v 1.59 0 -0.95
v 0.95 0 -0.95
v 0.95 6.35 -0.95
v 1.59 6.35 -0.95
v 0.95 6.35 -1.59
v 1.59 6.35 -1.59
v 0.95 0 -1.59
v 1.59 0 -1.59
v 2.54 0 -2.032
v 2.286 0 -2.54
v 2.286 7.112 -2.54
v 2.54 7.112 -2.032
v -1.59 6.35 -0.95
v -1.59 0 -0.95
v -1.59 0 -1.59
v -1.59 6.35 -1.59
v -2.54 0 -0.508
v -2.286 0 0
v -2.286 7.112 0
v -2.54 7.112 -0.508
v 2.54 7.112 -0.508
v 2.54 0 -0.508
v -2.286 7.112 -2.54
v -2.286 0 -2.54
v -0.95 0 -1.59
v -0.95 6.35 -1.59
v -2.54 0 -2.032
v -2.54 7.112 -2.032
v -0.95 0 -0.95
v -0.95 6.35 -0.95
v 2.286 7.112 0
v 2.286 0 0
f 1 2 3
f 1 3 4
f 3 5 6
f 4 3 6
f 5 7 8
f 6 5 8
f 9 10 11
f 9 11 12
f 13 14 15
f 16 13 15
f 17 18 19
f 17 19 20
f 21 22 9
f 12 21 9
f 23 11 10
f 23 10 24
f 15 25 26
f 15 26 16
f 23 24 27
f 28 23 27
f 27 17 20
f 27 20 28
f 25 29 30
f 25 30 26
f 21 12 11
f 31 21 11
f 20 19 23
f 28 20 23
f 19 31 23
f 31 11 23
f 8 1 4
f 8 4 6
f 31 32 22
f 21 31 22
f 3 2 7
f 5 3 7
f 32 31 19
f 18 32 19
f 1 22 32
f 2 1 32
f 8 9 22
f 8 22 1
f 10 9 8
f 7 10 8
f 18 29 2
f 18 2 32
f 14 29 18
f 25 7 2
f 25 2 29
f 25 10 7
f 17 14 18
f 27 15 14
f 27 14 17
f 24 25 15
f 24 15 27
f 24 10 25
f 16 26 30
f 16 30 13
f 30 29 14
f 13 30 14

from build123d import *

# Parameters (mm, degrees)
SKETCH1_W           = 2.54
SKETCH1_H           = 2.54
MAIN_BODY_DEPTH     = 7.112
CUT_EXTRUDE_3_DEPTH = 7.112
SKETCH2_W           = 0.64
SKETCH2_H           = 0.64
CUT_EXTRUDE_4_DEPTH = 6.35


with BuildPart() as part:
    # Sketch1 → Main Body (new body)
    with BuildSketch(Plane(origin=(0, 0, 0), x_dir=(1, 0, 0), z_dir=(0, 1, 0))):
        with Locations((1.27, 1.27)):
            Rectangle(SKETCH1_W, SKETCH1_H)
    main_body = extrude(amount=MAIN_BODY_DEPTH)

    # Sketch4 → Вырез-Вытянуть3 (cut)
    with BuildSketch(Plane(origin=(0, 0, 0), x_dir=(1, 0, 0), z_dir=(0, 1, 0))):
        Polygon((2.54, 2.54), (2.286, 2.54), (2.54, 2.032), align=None)
        Polygon((2.54, 0), (2.286, 0), (2.54, 0.508), align=None)
    cut_extrude_3 = extrude(amount=CUT_EXTRUDE_3_DEPTH, mode=Mode.SUBTRACT)

    # Sketch2 → Вырез-Вытянуть4 (cut)
    with BuildSketch(Plane(origin=(0, 0, 0), x_dir=(1, 0, 0), z_dir=(0, 1, 0))):
        with Locations((1.27, 1.27)):
            Rectangle(SKETCH2_W, SKETCH2_H)
    cut_extrude_4 = extrude(amount=CUT_EXTRUDE_4_DEPTH, mode=Mode.SUBTRACT)

    # Зеркальное отражение1: Main Body, Вырез-Вытянуть3, Вырез-Вытянуть4 across Right Plane
    add(main_body.mirror(Plane(origin=(0, 0, 0), x_dir=(0, 0, -1), z_dir=(1, 0, 0))))
    add(cut_extrude_3.mirror(Plane(origin=(0, 0, 0), x_dir=(0, 0, -1), z_dir=(1, 0, 0))), mode=Mode.SUBTRACT)
    add(cut_extrude_4.mirror(Plane(origin=(0, 0, 0), x_dir=(0, 0, -1), z_dir=(1, 0, 0))), mode=Mode.SUBTRACT)


solid = part.part
